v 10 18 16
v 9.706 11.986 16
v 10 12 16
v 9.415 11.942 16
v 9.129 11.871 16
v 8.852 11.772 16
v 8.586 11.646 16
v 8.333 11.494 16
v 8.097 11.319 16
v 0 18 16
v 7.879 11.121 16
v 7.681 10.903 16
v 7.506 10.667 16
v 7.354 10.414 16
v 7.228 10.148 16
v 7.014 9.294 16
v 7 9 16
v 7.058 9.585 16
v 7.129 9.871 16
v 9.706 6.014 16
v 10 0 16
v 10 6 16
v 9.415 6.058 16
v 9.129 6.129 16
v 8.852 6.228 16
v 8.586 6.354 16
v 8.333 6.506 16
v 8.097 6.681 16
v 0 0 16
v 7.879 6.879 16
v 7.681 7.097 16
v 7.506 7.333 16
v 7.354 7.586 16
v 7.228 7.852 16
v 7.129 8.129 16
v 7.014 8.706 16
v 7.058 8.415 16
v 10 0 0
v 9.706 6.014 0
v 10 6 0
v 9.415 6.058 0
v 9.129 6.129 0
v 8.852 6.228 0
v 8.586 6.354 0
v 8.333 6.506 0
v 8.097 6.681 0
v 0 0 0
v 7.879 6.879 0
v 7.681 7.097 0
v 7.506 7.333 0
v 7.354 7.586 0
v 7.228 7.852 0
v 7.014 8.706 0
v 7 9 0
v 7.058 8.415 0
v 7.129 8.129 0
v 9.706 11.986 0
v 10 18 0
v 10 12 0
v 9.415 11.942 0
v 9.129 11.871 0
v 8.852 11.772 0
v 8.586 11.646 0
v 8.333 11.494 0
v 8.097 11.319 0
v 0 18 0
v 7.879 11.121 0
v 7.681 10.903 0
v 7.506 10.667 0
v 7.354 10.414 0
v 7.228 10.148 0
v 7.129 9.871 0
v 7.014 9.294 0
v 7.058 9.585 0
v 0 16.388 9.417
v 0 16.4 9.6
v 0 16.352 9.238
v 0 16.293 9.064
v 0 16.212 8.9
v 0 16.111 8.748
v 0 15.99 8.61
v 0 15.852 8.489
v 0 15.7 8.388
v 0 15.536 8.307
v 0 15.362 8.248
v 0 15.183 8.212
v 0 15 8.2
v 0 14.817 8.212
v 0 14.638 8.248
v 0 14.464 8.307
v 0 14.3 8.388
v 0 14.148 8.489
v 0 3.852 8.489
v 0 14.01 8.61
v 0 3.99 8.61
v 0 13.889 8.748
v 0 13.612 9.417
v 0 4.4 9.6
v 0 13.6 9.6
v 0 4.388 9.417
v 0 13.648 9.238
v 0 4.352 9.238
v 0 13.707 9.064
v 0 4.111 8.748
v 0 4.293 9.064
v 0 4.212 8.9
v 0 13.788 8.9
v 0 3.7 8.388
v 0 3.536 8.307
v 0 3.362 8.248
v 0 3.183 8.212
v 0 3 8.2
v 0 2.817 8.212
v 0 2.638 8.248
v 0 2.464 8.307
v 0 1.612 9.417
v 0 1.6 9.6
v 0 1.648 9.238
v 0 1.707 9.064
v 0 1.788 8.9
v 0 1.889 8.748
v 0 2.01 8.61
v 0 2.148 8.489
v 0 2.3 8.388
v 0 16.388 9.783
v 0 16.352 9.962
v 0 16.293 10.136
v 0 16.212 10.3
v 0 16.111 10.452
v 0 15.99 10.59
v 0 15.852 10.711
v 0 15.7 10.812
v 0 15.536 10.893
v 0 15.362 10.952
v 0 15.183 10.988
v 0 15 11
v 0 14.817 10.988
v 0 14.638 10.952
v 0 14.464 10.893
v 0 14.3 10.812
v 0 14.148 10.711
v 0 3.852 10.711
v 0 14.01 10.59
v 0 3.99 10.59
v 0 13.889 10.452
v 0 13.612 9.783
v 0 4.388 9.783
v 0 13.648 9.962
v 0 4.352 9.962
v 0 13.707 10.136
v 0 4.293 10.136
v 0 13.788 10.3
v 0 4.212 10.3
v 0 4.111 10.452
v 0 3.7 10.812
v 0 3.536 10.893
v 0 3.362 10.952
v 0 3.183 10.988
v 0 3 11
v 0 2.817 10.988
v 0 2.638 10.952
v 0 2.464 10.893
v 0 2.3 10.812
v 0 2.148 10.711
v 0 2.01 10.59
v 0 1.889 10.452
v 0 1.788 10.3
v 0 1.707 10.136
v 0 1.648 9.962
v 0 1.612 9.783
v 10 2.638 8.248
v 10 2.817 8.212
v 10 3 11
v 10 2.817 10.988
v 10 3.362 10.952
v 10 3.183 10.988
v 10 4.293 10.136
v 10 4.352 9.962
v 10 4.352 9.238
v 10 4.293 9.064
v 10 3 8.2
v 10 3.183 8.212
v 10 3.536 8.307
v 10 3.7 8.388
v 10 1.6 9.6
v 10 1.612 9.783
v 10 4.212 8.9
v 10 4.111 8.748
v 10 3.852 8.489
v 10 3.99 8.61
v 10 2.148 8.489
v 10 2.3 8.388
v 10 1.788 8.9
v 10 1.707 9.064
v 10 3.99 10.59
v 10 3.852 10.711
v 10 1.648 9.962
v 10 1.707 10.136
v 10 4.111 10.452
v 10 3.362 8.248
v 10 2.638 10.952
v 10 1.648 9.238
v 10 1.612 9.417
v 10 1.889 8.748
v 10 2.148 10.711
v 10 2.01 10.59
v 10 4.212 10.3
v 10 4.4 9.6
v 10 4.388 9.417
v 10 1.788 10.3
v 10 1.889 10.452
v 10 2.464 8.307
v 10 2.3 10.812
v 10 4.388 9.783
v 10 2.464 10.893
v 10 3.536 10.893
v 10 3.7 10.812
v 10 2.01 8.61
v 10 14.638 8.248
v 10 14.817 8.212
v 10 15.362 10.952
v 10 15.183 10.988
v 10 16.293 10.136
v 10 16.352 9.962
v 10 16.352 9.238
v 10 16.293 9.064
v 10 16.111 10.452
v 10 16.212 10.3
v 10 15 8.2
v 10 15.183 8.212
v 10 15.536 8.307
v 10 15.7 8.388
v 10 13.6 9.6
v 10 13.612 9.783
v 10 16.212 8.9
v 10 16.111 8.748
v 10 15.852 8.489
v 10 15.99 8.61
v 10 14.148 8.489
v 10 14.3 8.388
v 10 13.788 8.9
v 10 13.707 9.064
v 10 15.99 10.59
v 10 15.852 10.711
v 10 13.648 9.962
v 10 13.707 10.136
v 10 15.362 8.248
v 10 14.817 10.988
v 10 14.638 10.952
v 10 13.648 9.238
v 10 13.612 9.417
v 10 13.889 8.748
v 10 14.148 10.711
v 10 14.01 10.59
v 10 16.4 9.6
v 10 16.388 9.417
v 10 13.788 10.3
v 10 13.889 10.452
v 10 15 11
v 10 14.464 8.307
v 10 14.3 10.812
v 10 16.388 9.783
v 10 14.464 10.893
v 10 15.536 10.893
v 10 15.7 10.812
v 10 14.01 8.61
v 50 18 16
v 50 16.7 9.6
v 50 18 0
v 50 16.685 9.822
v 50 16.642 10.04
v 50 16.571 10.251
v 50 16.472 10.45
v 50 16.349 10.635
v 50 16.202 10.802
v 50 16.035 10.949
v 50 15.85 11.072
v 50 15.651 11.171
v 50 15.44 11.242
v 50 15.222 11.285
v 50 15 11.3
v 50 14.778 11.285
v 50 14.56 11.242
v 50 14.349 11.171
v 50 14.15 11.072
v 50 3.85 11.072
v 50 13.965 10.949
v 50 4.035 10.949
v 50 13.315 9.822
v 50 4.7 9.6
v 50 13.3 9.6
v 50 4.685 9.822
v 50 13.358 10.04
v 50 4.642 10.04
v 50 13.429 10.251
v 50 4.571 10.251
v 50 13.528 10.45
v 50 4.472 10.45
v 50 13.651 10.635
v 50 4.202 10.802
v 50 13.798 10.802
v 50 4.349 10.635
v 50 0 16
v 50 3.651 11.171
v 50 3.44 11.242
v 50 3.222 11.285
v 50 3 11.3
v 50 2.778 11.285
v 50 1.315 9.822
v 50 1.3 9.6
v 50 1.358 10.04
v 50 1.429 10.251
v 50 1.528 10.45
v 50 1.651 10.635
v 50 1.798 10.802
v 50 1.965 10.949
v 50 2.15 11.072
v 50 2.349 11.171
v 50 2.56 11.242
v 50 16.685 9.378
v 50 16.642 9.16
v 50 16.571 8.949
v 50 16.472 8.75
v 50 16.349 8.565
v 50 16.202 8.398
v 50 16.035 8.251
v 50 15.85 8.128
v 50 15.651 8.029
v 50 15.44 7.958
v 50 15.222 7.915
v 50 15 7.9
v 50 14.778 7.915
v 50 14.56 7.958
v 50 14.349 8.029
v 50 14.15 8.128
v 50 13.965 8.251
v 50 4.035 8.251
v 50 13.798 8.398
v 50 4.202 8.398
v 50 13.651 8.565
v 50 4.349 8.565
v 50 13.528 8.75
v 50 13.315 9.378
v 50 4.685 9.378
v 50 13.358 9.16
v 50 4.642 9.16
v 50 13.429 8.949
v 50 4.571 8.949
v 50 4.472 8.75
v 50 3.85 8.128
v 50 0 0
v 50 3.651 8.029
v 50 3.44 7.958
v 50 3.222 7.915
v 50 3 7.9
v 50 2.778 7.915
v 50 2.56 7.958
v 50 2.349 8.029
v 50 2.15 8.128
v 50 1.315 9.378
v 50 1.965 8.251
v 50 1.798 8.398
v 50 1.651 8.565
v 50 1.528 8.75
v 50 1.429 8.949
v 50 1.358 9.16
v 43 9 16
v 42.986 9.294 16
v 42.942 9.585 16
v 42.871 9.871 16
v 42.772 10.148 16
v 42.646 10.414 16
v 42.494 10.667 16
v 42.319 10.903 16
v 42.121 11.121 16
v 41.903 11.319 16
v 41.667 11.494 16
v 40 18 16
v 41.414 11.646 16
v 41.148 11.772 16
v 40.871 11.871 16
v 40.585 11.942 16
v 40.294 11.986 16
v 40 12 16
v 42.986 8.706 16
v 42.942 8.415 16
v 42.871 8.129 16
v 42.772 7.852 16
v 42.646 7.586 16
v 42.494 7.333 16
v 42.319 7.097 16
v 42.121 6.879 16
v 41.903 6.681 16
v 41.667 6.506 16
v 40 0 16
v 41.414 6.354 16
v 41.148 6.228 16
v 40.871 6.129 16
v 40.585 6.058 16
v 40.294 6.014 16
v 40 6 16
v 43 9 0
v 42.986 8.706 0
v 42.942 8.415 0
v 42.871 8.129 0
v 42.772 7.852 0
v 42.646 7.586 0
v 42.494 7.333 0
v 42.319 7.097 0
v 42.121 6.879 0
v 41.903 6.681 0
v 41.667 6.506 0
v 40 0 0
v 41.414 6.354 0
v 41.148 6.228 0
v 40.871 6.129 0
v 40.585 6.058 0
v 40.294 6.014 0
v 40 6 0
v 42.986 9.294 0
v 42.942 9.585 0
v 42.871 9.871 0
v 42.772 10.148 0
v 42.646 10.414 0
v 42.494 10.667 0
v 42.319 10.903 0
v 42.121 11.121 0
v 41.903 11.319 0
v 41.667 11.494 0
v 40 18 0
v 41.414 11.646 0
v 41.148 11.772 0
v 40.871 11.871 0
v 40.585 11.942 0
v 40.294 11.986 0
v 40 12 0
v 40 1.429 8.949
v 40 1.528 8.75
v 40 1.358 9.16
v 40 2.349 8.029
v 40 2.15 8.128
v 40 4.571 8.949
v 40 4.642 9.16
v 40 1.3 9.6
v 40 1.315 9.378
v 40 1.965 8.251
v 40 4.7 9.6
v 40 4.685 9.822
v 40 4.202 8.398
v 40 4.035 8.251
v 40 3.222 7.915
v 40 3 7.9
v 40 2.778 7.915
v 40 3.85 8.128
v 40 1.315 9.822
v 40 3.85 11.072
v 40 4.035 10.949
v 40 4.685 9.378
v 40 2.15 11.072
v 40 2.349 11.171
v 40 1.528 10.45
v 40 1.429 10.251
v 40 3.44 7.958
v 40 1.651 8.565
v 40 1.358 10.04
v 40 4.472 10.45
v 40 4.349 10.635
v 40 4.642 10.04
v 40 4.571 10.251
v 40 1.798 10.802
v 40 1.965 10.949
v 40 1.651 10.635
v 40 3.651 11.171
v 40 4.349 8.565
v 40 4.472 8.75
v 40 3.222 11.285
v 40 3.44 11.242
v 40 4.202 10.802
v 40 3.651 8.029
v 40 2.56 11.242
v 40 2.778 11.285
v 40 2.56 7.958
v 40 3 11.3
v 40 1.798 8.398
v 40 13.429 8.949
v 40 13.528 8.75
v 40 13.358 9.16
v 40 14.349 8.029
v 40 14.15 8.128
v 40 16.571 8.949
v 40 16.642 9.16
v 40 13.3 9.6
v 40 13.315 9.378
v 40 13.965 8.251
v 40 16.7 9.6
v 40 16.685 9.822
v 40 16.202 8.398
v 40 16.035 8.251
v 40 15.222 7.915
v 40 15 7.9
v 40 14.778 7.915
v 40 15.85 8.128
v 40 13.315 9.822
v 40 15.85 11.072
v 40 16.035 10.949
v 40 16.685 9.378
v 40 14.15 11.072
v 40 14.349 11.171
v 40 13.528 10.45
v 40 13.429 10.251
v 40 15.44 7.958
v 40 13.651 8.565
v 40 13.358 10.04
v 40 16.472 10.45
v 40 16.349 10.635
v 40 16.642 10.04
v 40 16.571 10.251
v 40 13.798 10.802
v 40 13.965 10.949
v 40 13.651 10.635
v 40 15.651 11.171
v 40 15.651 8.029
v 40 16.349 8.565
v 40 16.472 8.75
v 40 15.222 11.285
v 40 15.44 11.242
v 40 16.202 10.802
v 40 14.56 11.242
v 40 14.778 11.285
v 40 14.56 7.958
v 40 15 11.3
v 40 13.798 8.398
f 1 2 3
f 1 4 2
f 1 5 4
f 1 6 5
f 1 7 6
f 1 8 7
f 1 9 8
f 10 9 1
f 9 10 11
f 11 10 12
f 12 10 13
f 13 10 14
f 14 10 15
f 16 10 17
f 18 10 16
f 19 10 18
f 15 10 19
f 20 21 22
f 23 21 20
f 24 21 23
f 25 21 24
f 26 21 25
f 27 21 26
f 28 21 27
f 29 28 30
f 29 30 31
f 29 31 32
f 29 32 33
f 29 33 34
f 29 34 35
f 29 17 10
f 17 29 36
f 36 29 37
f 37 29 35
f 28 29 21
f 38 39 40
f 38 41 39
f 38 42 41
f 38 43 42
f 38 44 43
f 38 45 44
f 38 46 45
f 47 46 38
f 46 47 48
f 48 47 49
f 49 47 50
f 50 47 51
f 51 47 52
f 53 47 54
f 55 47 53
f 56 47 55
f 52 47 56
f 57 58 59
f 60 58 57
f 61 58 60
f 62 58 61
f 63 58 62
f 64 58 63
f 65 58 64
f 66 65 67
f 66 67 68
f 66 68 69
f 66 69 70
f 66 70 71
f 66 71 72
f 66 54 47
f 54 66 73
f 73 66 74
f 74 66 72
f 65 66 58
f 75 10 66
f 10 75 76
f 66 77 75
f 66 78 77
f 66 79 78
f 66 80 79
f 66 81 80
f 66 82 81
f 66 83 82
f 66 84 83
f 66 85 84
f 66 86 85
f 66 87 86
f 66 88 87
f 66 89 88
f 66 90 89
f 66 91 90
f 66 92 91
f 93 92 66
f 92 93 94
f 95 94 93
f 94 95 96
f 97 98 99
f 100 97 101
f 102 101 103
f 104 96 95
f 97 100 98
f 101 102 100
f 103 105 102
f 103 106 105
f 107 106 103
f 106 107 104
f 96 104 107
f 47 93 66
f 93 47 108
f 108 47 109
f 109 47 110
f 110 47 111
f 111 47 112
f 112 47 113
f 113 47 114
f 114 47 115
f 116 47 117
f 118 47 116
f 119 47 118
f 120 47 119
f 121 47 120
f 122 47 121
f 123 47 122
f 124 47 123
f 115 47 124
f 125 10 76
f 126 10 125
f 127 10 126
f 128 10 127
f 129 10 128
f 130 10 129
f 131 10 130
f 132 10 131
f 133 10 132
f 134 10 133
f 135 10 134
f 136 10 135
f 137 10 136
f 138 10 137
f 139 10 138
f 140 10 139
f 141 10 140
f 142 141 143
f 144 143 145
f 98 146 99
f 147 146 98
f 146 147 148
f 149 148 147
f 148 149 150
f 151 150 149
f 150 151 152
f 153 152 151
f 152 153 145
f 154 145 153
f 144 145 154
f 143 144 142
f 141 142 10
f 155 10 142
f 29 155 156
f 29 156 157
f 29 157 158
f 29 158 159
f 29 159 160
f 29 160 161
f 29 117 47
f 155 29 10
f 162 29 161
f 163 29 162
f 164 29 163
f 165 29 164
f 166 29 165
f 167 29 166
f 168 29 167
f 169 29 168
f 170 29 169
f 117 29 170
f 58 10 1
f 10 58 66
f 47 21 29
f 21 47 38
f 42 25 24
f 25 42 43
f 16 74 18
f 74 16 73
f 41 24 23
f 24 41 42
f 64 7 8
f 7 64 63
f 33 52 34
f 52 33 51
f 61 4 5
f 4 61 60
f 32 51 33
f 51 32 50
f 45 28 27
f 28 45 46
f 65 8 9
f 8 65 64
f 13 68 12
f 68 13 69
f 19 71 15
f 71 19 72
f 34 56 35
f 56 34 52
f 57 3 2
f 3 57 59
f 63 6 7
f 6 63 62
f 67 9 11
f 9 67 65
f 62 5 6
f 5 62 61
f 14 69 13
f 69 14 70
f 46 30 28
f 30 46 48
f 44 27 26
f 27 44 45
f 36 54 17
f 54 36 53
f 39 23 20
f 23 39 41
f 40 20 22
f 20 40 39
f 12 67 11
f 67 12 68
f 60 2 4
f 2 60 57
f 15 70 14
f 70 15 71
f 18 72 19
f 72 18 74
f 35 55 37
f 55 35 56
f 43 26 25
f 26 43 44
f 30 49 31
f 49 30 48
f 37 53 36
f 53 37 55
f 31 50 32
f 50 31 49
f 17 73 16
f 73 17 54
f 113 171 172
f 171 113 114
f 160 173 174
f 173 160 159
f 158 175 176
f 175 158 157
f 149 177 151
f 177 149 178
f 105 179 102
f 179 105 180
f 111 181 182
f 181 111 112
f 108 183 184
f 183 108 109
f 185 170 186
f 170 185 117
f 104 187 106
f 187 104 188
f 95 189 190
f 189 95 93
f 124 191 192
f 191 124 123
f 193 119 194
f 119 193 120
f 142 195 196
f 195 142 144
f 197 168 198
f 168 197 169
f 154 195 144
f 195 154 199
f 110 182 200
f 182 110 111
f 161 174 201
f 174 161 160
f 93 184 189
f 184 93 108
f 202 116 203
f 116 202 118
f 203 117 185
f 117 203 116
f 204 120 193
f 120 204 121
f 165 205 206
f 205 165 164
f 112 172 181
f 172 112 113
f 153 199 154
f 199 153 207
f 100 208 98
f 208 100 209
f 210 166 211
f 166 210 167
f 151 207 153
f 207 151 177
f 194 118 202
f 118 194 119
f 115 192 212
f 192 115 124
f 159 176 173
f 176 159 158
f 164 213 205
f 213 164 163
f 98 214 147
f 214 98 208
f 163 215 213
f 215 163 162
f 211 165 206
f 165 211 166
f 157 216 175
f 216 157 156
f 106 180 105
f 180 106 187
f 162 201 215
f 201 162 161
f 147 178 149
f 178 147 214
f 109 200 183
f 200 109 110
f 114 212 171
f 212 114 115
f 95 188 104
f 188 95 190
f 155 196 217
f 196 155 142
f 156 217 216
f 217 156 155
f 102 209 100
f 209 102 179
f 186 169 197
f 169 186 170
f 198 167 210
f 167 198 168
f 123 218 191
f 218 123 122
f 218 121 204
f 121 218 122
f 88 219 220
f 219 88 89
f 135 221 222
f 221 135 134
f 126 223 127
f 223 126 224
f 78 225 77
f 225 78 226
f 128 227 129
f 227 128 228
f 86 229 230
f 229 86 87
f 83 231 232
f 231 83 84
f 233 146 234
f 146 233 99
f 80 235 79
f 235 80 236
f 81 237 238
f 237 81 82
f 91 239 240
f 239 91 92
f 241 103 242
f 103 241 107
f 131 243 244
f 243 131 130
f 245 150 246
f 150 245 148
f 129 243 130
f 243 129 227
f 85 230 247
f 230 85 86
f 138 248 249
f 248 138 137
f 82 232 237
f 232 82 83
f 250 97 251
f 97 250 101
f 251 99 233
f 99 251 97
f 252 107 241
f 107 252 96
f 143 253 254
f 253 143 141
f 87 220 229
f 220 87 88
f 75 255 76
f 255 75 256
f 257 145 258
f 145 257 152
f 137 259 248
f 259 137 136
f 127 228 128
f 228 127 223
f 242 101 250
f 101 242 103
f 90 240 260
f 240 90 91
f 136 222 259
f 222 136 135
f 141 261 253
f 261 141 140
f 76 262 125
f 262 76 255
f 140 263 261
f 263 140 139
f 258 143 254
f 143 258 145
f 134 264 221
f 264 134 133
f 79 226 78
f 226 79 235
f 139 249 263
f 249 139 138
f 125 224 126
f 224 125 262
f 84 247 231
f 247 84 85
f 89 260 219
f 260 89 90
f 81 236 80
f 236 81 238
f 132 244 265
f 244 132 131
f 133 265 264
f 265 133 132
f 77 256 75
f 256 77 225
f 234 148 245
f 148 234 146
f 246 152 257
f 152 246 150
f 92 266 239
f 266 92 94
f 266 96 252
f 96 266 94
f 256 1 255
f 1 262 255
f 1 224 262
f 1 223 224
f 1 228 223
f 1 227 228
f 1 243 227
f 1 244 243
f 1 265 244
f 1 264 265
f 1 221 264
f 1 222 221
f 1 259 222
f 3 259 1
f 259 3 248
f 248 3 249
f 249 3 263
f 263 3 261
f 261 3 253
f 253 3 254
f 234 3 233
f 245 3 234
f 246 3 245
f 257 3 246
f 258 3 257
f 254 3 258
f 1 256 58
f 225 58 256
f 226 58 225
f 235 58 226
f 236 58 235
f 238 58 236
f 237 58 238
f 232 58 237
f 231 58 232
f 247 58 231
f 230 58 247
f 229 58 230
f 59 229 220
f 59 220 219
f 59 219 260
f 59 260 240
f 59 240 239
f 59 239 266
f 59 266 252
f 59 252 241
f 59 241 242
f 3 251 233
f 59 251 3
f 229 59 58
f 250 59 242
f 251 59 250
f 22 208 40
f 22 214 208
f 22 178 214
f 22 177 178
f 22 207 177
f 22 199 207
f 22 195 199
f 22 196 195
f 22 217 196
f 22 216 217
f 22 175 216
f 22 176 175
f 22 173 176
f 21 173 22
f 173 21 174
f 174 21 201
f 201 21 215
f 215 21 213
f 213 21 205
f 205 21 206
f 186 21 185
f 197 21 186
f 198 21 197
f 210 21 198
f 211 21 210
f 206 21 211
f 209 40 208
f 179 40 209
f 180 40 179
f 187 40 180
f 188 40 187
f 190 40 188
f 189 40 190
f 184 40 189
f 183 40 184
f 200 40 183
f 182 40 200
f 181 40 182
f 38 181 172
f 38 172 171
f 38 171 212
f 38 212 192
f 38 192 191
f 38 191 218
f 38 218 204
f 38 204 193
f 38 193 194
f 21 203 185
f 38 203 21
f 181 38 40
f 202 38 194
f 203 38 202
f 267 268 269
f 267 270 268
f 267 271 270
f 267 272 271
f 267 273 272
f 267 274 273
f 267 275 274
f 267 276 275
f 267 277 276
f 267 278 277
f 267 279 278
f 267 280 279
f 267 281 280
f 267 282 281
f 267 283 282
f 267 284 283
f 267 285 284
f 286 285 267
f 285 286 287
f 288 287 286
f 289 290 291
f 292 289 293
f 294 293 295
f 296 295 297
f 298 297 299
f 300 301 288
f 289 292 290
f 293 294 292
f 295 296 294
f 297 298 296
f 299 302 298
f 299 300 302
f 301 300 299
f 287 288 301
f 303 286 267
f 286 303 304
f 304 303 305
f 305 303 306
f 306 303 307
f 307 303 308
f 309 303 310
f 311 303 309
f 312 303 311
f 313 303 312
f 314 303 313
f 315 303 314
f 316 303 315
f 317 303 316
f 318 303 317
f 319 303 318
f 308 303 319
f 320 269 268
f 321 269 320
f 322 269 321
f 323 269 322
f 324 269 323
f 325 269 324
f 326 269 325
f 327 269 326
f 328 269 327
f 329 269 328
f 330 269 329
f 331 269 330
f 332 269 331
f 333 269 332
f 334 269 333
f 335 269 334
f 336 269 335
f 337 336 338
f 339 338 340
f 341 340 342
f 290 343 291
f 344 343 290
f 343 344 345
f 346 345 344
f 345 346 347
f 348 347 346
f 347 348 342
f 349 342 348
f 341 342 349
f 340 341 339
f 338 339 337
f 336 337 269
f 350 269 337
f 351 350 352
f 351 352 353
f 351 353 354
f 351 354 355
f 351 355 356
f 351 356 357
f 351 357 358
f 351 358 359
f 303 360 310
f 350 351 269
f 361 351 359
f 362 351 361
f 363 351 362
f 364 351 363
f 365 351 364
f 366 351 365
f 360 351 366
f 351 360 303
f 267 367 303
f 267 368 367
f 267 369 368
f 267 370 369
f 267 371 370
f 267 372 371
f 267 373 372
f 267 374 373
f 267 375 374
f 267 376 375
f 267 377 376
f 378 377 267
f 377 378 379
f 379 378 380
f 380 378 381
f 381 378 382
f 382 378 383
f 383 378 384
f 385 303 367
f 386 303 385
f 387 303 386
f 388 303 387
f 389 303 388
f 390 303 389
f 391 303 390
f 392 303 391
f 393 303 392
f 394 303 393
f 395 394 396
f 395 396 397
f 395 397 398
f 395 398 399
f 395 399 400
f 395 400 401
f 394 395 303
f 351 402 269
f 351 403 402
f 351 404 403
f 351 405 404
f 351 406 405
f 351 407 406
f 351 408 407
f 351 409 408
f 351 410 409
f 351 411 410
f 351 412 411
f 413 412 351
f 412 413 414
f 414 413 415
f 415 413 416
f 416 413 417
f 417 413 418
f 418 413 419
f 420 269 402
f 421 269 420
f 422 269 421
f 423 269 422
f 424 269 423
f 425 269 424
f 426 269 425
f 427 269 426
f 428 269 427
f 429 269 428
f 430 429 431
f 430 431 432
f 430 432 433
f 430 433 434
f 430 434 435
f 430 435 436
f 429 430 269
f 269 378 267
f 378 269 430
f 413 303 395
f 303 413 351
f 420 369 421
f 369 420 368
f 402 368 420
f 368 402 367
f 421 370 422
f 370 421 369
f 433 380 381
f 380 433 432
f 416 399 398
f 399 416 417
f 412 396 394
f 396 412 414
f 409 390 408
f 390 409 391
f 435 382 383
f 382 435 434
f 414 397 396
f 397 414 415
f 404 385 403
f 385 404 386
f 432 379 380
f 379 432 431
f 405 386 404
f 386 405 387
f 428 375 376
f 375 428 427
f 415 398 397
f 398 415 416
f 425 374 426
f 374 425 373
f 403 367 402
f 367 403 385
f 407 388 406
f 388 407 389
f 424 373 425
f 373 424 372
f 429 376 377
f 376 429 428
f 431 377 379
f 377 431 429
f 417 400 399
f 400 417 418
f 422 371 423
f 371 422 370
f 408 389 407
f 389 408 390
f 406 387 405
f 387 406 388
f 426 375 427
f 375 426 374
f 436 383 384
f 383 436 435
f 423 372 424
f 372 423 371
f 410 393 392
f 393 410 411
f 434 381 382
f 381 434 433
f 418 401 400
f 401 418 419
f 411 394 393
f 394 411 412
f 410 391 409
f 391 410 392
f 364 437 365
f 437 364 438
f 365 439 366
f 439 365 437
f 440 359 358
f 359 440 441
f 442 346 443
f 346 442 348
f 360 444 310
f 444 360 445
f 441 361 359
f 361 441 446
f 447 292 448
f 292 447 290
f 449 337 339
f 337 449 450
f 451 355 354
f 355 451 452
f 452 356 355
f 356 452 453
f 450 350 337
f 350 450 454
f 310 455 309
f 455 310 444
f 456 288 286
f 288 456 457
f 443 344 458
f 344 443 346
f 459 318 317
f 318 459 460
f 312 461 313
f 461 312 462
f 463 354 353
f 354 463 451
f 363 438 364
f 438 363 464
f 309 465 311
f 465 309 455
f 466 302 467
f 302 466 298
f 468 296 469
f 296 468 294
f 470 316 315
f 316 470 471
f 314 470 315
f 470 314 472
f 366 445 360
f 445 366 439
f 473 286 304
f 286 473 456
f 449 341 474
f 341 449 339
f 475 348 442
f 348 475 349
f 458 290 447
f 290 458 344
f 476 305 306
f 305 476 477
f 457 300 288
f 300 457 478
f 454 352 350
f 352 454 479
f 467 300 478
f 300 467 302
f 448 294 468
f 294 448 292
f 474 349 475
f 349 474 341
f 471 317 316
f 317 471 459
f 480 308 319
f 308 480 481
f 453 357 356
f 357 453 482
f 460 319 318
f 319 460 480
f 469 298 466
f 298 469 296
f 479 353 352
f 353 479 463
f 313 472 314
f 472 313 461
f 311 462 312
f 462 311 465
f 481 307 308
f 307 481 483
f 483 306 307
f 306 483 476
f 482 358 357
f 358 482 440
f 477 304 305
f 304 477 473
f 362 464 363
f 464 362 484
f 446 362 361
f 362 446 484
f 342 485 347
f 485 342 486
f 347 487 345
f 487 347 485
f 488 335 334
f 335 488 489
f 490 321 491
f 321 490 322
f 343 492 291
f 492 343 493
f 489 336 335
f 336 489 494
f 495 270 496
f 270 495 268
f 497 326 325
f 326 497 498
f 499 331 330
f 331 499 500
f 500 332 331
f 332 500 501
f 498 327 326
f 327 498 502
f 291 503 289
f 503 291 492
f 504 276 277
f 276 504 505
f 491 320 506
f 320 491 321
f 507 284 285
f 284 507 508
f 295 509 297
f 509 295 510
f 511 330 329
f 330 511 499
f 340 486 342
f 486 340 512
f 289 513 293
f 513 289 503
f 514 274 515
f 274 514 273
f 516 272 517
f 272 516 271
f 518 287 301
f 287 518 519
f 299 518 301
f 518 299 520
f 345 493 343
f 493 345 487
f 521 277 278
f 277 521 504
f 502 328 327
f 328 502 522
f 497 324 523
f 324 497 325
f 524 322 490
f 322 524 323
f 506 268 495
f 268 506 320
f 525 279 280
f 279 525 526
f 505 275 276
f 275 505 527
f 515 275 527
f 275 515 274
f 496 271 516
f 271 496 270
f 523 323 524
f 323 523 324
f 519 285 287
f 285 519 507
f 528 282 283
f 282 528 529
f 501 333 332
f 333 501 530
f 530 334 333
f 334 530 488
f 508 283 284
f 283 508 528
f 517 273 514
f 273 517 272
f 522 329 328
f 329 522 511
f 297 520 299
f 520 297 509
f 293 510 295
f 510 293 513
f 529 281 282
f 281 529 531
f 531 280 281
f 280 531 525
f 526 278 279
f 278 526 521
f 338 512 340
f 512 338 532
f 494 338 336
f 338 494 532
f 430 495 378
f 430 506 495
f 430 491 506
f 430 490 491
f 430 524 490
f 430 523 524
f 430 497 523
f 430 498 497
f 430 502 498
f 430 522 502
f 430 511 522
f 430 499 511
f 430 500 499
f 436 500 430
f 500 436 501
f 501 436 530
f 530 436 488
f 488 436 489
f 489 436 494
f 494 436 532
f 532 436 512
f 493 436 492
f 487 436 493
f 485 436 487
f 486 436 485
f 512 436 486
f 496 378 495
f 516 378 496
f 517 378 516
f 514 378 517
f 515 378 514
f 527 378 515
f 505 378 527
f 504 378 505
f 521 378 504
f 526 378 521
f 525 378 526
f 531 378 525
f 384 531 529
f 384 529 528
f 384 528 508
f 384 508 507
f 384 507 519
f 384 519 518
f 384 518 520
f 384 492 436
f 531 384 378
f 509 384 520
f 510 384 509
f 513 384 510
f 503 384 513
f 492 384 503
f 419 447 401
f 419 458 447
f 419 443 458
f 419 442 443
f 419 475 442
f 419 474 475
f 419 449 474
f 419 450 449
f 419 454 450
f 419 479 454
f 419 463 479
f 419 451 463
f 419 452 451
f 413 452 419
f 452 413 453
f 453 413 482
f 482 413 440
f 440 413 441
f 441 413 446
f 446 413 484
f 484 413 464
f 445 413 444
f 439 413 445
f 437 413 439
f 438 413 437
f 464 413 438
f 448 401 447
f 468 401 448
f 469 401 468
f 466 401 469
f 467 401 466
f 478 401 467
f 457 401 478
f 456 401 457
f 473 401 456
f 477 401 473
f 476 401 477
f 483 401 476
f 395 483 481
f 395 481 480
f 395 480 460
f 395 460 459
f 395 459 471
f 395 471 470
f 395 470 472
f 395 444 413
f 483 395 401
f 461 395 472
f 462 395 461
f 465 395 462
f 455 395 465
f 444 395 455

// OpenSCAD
//=====================================================================
// BlitzBox
//
// CableClamp.scad
//
// Split cable clamp
//
// Author: Björn Verbruggen
//=====================================================================



//=====================================================================
// PARAMETERS
//=====================================================================

//--------------------------------------------------
// Block
//--------------------------------------------------

clamp_width  = 20;
clamp_length = 18;
clamp_height = 16;


//--------------------------------------------------
// Cable
//--------------------------------------------------

cable_diameter = 6.0;
cable_radius   = cable_diameter / 2;


//--------------------------------------------------
// M3
//--------------------------------------------------

m3_fixed_hole     = 2.8;
m3_clearance_hole = 3.4;

screw_offset = 3;


//--------------------------------------------------
// Boolean overlap
//--------------------------------------------------

boolean_overlap = 0.1;



//=====================================================================
// COMPLETE BLOCK
//=====================================================================

module clamp_body(fixed = true)
{

    difference()
    {

        //--------------------------------------------------
        // Block
        //--------------------------------------------------

        cube([
            clamp_width,
            clamp_length,
            clamp_height
        ]);


        //--------------------------------------------------
        // Cable hole (vertical)
        //--------------------------------------------------

        translate([
            clamp_width / 2,
            clamp_length / 2,
            -1
        ])

        cylinder(
            h = clamp_height + 2,
            r = cable_radius,
            $fn = 64
        );


        //--------------------------------------------------
        // Left M3
        //--------------------------------------------------

        translate([
            -1,
            screw_offset,
            clamp_height * 0.6
        ])

        rotate([0,90,0])

        cylinder(
            h = clamp_width + 2,
            d = fixed ? m3_fixed_hole : m3_clearance_hole,
            $fn = 48
        );


        //--------------------------------------------------
        // Right M3
        //--------------------------------------------------

        translate([
            -1,
            clamp_length - screw_offset,
            clamp_height * 0.6
        ])

        rotate([0,90,0])

        cylinder(
            h = clamp_width + 2,
            d = fixed ? m3_fixed_hole : m3_clearance_hole,
            $fn = 48
        );

    }

}



//=====================================================================
// HALF CLAMP
//=====================================================================

module cable_clamp(fixed = true)
{

    intersection()
    {

        clamp_body(fixed);

        if (fixed)
        {

            translate([
                -boolean_overlap,
                0,
                0
            ])

            cube([
                (clamp_width / 2) + boolean_overlap,
                clamp_length,
                clamp_height
            ]);

        }
        else
        {

            translate([
                clamp_width / 2,
                0,
                0
            ])

            cube([
                (clamp_width / 2) + boolean_overlap,
                clamp_length,
                clamp_height
            ]);

        }

    }

}



//=====================================================================
// TEST
//=====================================================================

translate([0,0,0])
    cable_clamp(true);

translate([30,0,0])
    cable_clamp(false);
